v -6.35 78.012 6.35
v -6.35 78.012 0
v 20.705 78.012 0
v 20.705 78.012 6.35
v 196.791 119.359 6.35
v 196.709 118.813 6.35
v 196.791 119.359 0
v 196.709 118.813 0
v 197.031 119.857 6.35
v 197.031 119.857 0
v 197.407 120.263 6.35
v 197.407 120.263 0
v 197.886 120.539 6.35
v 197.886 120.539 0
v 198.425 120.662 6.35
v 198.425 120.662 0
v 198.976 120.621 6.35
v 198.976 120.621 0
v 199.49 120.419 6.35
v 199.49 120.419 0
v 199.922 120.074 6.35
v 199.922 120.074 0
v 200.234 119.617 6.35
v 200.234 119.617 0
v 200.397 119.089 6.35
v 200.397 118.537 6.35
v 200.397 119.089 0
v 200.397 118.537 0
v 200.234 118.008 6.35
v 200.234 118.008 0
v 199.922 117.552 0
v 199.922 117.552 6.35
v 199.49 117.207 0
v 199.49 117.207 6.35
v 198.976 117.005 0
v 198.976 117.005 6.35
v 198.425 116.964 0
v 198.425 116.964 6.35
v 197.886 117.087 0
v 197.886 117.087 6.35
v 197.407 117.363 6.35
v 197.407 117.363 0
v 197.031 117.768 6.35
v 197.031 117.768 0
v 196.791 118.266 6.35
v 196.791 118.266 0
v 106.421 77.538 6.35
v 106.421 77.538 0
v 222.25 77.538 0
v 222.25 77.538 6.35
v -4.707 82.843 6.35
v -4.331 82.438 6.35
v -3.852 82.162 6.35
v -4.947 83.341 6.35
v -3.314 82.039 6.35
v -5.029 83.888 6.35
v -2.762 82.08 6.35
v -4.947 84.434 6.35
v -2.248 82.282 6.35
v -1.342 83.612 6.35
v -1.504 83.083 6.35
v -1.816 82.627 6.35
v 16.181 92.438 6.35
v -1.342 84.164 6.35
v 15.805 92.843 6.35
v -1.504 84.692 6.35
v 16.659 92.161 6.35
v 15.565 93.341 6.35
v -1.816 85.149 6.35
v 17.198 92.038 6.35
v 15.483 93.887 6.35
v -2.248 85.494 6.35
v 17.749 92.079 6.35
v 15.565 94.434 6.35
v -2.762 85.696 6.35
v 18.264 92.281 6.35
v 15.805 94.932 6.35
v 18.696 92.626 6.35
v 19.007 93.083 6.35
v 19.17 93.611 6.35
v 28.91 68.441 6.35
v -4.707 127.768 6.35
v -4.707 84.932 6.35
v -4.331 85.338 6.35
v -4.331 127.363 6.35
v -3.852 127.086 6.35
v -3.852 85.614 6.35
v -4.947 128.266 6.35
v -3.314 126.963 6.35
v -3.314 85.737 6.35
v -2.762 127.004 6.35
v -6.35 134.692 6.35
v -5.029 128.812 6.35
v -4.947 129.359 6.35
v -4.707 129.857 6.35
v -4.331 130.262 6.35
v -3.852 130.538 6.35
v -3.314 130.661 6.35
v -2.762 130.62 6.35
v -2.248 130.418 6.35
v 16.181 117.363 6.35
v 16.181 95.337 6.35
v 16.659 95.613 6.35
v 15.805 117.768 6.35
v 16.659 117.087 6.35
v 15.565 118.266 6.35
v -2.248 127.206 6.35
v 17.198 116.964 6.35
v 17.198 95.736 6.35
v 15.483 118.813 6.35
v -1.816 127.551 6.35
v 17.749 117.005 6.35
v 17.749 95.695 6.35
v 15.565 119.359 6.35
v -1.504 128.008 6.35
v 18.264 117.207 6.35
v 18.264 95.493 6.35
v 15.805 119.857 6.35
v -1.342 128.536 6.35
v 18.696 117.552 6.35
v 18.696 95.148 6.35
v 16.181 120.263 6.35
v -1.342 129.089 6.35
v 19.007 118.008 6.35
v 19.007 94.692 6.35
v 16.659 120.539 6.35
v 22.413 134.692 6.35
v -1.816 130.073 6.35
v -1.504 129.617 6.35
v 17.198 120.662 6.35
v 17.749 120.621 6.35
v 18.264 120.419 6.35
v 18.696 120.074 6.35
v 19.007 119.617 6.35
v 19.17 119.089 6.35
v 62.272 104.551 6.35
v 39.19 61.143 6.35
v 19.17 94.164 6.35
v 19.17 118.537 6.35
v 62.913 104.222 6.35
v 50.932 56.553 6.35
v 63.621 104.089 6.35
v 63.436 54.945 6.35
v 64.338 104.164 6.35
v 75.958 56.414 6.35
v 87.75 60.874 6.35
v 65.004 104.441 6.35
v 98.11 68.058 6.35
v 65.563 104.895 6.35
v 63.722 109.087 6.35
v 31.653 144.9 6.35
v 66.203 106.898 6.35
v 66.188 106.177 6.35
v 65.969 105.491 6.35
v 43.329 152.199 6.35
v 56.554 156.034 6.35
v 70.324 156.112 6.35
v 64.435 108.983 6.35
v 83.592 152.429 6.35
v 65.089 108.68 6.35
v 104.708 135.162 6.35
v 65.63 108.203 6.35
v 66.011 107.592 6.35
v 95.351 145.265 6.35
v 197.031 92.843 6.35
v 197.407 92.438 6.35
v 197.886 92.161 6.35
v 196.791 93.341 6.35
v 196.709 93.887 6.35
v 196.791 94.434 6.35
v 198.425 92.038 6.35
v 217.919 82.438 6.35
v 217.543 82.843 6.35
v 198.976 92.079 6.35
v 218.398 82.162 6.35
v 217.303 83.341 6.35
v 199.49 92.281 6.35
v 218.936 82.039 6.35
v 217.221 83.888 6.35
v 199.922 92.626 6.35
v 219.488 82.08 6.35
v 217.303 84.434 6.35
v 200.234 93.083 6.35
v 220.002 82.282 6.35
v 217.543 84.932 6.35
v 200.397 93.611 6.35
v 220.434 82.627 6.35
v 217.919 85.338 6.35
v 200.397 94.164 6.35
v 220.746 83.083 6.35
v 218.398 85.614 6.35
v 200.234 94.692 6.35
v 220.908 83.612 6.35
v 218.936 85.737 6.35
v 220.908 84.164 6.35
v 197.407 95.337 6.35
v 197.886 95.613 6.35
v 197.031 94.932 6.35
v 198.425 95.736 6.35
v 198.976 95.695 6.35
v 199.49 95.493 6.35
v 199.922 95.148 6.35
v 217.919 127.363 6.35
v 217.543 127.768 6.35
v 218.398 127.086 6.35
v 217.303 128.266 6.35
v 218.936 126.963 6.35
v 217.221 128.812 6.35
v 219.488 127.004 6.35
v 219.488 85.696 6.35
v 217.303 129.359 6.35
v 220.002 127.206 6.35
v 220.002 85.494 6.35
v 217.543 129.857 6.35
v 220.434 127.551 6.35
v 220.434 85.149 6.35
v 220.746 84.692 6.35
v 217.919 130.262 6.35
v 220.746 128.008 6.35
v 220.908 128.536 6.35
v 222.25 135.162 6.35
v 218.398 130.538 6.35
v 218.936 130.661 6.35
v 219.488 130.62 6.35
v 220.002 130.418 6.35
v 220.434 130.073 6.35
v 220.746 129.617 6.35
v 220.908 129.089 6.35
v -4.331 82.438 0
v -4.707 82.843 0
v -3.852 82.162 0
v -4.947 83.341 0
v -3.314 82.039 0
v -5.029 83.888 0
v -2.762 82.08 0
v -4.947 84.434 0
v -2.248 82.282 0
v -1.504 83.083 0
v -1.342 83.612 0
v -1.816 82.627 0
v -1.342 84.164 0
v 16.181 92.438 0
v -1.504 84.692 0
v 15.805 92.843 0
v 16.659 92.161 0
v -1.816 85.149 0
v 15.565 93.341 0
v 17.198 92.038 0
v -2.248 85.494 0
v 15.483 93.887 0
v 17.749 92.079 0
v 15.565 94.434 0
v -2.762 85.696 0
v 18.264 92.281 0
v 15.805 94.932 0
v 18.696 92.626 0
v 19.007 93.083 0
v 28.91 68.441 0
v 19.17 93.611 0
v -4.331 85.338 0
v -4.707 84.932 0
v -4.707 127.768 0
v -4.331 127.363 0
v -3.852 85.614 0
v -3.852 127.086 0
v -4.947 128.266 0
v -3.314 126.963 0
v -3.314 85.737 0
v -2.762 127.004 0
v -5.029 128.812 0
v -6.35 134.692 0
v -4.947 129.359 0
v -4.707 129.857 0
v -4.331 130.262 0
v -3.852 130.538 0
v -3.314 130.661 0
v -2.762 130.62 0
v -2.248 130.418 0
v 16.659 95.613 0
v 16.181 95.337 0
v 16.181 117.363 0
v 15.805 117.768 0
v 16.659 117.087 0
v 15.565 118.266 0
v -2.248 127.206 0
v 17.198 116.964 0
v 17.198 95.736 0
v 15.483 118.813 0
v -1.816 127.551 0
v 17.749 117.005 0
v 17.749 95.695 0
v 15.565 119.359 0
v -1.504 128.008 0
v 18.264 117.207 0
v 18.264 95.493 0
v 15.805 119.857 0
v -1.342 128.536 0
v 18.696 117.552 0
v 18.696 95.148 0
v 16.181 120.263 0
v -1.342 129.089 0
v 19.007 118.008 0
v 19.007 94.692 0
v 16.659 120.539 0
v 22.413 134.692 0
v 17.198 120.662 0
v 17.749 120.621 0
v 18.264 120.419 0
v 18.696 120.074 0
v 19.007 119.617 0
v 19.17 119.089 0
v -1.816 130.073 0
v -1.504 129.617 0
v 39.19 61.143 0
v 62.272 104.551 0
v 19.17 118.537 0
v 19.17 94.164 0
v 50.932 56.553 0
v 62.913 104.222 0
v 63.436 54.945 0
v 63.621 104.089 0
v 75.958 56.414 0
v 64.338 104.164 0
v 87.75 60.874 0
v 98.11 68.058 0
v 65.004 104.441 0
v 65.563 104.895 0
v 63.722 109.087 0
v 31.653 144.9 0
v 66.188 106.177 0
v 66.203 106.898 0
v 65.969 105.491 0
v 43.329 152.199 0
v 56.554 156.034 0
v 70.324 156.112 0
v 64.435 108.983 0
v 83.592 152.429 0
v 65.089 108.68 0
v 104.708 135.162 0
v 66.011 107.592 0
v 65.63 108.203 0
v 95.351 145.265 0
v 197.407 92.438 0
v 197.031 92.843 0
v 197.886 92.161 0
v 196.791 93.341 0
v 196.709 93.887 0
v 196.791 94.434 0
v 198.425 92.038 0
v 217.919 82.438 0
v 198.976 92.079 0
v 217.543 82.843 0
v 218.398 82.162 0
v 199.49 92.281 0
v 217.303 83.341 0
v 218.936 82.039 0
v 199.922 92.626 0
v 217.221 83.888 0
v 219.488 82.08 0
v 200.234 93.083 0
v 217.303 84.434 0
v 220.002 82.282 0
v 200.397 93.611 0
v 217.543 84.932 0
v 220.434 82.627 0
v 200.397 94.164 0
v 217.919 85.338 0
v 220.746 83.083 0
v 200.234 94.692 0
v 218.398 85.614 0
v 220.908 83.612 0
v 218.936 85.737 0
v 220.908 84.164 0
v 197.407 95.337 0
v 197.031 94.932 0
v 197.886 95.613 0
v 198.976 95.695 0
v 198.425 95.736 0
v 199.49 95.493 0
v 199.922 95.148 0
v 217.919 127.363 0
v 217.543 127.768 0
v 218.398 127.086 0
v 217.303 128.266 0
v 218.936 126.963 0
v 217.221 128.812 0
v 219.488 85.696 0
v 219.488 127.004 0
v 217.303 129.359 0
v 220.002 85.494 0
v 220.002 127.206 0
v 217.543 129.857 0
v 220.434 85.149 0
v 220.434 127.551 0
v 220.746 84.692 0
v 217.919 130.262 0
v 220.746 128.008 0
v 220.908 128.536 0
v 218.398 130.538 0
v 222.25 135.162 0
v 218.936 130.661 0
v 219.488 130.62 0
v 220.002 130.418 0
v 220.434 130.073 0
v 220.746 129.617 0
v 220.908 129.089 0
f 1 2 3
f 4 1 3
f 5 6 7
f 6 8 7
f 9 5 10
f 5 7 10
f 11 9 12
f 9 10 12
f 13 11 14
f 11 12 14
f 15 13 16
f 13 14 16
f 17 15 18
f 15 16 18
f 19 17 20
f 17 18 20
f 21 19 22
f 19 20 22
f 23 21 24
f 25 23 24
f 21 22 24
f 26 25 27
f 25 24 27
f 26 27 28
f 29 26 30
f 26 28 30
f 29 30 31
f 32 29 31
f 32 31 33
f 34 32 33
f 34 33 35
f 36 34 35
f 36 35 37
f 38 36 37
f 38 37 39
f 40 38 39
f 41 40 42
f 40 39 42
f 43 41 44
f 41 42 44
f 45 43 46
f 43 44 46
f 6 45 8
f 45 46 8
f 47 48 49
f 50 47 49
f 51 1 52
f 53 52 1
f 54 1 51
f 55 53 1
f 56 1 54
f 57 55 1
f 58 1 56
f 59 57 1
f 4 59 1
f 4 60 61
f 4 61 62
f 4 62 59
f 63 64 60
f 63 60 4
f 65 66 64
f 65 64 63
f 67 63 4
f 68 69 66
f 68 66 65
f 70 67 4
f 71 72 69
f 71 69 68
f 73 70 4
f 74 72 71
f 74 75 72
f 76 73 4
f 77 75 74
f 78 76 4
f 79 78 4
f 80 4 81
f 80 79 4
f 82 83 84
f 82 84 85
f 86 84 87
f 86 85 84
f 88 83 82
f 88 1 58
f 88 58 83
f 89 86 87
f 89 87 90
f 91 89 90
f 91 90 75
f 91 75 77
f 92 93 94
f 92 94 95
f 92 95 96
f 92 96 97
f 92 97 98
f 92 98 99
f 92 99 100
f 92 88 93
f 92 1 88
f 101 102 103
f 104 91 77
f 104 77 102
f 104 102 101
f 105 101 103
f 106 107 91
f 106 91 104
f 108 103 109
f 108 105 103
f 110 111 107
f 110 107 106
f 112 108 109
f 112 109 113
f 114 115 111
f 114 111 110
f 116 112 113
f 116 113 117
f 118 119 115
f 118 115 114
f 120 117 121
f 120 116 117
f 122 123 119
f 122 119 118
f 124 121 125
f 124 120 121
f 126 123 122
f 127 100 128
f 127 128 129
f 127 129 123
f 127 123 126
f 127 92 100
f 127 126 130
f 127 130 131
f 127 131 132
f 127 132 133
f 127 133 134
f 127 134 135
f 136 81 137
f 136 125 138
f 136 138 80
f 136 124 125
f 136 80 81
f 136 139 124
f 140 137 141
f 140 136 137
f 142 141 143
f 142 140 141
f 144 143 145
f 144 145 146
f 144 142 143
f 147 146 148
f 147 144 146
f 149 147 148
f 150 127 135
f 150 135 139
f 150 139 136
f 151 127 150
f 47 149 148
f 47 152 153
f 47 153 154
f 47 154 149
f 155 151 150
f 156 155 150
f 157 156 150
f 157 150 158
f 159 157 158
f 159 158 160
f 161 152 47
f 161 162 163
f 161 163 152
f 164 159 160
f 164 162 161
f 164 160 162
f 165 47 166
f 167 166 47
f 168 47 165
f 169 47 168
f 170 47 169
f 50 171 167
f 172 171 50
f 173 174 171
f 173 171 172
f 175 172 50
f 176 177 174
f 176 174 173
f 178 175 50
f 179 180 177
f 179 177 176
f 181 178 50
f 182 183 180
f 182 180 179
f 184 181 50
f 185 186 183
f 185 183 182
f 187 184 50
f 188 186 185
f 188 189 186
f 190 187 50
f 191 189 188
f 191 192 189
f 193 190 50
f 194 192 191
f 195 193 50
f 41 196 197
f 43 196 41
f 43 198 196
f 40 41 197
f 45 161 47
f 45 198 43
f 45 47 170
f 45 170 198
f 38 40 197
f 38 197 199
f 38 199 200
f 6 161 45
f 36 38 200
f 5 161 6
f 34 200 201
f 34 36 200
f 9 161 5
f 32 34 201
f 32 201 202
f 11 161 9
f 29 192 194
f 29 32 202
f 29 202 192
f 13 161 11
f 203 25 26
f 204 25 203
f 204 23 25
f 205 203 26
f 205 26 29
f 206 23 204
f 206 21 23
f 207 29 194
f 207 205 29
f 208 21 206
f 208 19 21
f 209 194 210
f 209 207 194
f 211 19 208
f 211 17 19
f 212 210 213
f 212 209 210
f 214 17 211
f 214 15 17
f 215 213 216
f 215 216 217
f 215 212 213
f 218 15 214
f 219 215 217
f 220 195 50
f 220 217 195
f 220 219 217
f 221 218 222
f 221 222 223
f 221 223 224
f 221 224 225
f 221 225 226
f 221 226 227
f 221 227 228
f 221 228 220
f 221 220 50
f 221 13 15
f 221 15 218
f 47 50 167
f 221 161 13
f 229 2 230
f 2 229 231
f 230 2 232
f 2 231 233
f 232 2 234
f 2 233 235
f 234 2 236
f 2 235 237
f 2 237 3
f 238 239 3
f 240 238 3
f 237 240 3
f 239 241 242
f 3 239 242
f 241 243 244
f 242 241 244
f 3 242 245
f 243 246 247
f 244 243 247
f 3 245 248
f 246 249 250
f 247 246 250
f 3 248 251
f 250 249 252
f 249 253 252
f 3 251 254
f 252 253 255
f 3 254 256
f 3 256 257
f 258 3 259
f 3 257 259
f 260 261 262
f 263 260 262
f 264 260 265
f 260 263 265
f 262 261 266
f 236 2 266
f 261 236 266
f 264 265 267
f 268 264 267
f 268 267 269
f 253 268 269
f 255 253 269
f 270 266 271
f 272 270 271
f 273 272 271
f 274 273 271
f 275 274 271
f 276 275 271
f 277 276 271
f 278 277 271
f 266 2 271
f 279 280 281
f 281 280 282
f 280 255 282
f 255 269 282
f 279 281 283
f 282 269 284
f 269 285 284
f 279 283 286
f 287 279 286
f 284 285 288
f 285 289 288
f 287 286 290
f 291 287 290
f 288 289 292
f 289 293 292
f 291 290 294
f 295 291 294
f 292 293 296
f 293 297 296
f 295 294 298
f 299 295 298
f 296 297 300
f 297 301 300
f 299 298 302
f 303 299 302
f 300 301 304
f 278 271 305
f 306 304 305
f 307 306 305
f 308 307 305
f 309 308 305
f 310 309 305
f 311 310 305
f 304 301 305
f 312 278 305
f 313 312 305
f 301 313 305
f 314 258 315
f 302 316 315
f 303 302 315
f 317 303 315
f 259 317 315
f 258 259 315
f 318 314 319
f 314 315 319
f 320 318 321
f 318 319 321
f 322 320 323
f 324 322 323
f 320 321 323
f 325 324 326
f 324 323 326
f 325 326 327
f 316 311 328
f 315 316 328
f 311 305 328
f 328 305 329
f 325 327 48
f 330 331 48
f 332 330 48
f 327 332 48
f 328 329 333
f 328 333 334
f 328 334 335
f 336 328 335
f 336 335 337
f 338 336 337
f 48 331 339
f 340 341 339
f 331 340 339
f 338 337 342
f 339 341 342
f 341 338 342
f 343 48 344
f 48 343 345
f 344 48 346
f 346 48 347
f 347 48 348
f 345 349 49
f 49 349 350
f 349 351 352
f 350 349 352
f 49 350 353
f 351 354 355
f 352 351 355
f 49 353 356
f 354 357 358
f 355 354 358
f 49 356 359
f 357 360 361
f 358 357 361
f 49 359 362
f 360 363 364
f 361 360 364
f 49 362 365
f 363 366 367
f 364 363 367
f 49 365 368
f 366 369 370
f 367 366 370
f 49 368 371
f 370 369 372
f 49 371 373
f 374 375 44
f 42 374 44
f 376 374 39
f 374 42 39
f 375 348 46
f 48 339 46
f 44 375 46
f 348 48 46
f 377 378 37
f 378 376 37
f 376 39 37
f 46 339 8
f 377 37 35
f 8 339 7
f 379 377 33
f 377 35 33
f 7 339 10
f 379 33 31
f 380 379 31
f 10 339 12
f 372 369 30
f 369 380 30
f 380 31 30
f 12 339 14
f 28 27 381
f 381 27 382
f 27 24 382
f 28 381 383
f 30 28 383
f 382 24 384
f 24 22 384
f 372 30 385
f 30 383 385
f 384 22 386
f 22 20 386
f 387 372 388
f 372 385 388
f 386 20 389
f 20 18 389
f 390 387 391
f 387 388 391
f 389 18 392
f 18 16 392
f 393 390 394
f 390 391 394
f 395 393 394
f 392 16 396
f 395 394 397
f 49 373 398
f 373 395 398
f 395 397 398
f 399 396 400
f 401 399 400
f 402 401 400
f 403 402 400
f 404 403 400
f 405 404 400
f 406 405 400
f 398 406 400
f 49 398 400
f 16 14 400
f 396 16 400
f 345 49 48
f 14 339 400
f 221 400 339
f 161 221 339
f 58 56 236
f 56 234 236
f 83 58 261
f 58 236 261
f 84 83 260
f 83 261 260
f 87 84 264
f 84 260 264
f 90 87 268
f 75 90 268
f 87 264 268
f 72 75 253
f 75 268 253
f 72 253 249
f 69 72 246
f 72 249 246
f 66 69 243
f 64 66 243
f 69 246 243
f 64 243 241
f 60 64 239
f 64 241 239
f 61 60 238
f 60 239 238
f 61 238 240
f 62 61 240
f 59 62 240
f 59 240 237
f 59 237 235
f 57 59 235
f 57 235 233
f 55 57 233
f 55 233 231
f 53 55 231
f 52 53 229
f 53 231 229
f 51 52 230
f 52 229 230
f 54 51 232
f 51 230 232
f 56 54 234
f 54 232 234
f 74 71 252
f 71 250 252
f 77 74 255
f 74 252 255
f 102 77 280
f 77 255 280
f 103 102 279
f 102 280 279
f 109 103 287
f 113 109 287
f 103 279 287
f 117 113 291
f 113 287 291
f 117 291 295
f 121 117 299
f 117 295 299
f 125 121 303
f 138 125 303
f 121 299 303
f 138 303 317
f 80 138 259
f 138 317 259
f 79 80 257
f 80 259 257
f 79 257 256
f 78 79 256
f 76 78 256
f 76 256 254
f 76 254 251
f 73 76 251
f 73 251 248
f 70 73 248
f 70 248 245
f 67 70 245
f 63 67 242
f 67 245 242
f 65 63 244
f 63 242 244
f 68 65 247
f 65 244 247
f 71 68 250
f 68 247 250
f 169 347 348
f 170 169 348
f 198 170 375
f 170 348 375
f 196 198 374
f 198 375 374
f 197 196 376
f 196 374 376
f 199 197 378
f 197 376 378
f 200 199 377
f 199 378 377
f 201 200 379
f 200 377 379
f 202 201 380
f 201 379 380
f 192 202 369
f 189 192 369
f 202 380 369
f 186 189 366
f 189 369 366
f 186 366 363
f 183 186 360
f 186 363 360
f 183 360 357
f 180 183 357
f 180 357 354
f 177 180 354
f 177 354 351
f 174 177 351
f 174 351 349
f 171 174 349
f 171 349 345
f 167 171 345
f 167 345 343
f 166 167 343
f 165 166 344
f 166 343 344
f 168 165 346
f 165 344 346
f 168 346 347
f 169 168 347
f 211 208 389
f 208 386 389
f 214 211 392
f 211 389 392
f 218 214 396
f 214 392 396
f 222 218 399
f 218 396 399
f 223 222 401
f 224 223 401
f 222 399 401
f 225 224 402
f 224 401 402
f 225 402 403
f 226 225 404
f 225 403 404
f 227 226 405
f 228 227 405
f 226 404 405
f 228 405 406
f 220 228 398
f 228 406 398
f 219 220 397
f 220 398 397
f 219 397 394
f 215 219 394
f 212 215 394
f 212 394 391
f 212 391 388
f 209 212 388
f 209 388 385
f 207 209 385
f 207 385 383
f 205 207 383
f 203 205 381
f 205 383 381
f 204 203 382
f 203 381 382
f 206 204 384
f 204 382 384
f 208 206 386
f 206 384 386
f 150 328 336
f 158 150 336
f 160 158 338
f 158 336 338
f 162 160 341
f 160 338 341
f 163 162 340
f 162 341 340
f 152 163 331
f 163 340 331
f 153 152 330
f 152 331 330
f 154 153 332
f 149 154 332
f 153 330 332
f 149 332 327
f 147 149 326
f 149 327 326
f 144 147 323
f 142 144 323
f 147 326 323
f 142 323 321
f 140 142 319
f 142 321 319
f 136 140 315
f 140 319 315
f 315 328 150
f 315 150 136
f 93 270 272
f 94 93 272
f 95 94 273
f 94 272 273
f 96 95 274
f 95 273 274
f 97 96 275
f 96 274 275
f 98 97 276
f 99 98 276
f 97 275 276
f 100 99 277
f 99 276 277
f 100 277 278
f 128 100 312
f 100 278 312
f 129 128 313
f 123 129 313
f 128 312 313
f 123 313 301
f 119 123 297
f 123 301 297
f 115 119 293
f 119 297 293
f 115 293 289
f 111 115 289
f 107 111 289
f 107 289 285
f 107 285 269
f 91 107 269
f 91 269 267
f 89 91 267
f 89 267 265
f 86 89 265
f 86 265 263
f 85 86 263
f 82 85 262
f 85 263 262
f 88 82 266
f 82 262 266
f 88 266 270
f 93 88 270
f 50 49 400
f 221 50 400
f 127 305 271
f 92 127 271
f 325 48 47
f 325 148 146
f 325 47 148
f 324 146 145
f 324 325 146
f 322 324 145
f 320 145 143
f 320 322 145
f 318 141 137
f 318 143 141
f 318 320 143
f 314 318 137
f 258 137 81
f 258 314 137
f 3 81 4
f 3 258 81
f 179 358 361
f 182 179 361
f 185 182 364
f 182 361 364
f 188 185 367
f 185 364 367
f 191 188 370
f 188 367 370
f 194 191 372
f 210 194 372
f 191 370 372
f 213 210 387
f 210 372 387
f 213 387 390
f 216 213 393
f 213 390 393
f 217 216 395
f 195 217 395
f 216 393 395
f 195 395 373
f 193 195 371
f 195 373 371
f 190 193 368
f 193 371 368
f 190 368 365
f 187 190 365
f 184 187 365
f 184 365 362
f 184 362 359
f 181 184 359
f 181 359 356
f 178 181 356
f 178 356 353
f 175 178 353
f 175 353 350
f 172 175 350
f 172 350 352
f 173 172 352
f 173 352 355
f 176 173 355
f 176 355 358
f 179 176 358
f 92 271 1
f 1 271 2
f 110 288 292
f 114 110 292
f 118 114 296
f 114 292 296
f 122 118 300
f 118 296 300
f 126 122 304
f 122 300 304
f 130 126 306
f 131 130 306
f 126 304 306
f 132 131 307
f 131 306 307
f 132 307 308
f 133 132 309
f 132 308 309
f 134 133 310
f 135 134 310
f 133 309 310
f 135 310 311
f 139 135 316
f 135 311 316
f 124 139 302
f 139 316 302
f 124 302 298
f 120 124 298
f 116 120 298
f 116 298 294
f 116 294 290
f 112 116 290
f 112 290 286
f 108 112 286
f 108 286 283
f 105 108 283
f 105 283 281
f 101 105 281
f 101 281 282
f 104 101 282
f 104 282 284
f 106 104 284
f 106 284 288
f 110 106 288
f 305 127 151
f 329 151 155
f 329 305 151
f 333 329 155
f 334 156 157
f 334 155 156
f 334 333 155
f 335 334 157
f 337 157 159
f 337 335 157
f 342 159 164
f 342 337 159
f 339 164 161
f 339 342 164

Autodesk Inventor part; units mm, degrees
ref_plane "YZ Plane" through (0, 0, 0) normal (1, 0, 0) x (0, 1, 0)
ref_plane "XZ Plane" through (0, 0, 0) normal (0, 1, 0) x (-1, 0, 0)
ref_plane "XY Plane" through (0, 0, 0) normal (0, 0, 1) x (1, 0, 0)
sketch "Sketch1" plane through (0, 0, 0) normal (0, 0, 1) x (1, 0, 0)
  line L0 (0, 78.0122) -> (0, 82.508) projected
  line L1 (-6.35, 82.508) -> (-6.35, 78.0122) projected
  line L2 (-6.35, 78.0122) -> (0, 78.0122) projected
  line L3 (222.25, 130.6664) -> (222.25, 135.1622) projected
  line L4 (215.9, 135.1622) -> (222.25, 135.1622) projected
  line L5 (215.9, 135.1622) -> (215.9, 130.6664) projected
  line L6 (222.25, 77.5379) -> (222.25, 135.1622)
  line L7 (-6.35, 134.6915) -> (-6.35, 78.0122)
  arc A0 (65.1726, 108.6235) -> (63.7223, 104.0872) centre (63.7223, 106.5872) ccw projected
  line L8 (222.25, 135.1622) -> (104.7076, 135.1622)
  line L9 (22.4128, 134.6915) -> (-6.35, 134.6915)
  line L10 (-6.35, 78.0122) -> (20.7049, 78.0122)
  line L11 (106.4207, 77.5379) -> (222.25, 77.5379)
  arc A1 (104.7076, 135.1622) -> (22.4128, 134.6915) centre (63.7223, 106.5872) ccw
  arc A2 (20.7049, 78.0122) -> (106.4207, 77.5379) centre (63.7223, 106.5872) ccw
  line L12 (215.9, 130.6664) -> (222.25, 130.6664) projected
  line L13 (0, 82.508) -> (-6.35, 82.508) projected
  point P0 (0, 0)
extrude "Extrusion1" add sketch "Sketch1" along normal blind 6.35
sketch "Sketch2" plane through (0, 0, 0) normal (0, 0, -1) x (-1, 0, 0)
  line L0 (-53.2456, 114.8496) -> (-74.1989, 114.8496) projected
  line L1 (-13.716, 122.4622) -> (-13.716, 90.7122) projected
  line L2 (-63.7223, 114.8496) -> (-63.7223, 83.3208) construction
  line L3 (-13.716, 106.5872) -> (-74.4954, 106.5872) construction
  arc A0 (-63.7223, 109.0872) -> (-61.2223, 106.5872) centre (-63.7223, 106.5872) ccw
  line L4 (-63.7223, 109.0872) -> (-62.2719, 104.5509)
  point P0 (0, 0)
  dimension "d2" = 5
  dimension "d3" = 4.7625
extrude "Extrusion2" cut sketch "Sketch2" against normal through all
sketch "Sketch3" plane through (0, 0, 0) normal (0, 0, -1) x (-1, 0, 0)
  line L0 (6.35, 134.6915) -> (6.35, 78.0122) construction
  line L1 (-222.25, 135.1622) -> (-104.7076, 135.1622) construction
  line L2 (-222.25, 77.5379) -> (-222.25, 135.1622) construction
  line L3 (-106.4207, 77.5379) -> (-222.25, 77.5379) construction
  line L4 (-215.9, 135.1622) -> (-215.9, 130.6664) construction
  line L5 (-217.6131, 96.5879) -> (-200.4173, 96.5879) construction
  line L6 (-200.4173, 90.2379) -> (-217.6131, 90.2379) construction
  line L7 (-217.6131, 90.2379) -> (-217.6131, 96.5879) construction
  line L8 (-217.6131, 121.9879) -> (-200.4173, 121.9879) construction
  line L9 (-200.4173, 115.6379) -> (-217.6131, 115.6379) construction
  line L10 (-217.6131, 115.6379) -> (-217.6131, 121.9879) construction
  circle A0 centre (-219.075, 128.8122) radius 1.8542
  circle A1 centre (-198.5631, 118.8129) radius 1.8542
  line L11 (-222.25, 106.3501) -> (-215.9, 106.3501) construction
  circle A2 centre (-219.075, 83.8879) radius 1.8542
  circle A3 centre (-198.5631, 93.8872) radius 1.8542
  line L12 (-107.95, 135.1622) -> (-107.95, 78.0122) construction
  circle A4 centre (3.175, 128.8122) radius 1.8542
  circle A5 centre (-17.3369, 118.8129) radius 1.8542
  circle A6 centre (-17.3369, 93.8872) radius 1.8542
  circle A7 centre (3.175, 83.8879) radius 1.8542
  line L13 (-200.4173, 121.9879) -> (-200.4173, 115.6379) projected
  line L14 (-200.4173, 96.5879) -> (-200.4173, 90.2379) projected
  point P0 (0, 0)
  point P1 (-215.9, 135.1622)
  dimension "d7" = 3.7084
  dimension "d8" = 3.175
  dimension "d9" = 3.175
  dimension "d10" = 6.35
  dimension "d11" = 3.7084
  dimension "d12" = 19.05
  dimension "d13" = 28.8121
  dimension "d14" = 28.8121
  dimension "d15" = 114.3
  dimension "d16" = 114.3
extrude "Extrusion3" cut sketch "Sketch3" against normal through all
equation "\"d8\" = d9"
equation "\"d13\" = d14"
equation "\"d15\" = d16"
properties part number "tiltStructureCrossBeam" material "Wood (Cherry)"
